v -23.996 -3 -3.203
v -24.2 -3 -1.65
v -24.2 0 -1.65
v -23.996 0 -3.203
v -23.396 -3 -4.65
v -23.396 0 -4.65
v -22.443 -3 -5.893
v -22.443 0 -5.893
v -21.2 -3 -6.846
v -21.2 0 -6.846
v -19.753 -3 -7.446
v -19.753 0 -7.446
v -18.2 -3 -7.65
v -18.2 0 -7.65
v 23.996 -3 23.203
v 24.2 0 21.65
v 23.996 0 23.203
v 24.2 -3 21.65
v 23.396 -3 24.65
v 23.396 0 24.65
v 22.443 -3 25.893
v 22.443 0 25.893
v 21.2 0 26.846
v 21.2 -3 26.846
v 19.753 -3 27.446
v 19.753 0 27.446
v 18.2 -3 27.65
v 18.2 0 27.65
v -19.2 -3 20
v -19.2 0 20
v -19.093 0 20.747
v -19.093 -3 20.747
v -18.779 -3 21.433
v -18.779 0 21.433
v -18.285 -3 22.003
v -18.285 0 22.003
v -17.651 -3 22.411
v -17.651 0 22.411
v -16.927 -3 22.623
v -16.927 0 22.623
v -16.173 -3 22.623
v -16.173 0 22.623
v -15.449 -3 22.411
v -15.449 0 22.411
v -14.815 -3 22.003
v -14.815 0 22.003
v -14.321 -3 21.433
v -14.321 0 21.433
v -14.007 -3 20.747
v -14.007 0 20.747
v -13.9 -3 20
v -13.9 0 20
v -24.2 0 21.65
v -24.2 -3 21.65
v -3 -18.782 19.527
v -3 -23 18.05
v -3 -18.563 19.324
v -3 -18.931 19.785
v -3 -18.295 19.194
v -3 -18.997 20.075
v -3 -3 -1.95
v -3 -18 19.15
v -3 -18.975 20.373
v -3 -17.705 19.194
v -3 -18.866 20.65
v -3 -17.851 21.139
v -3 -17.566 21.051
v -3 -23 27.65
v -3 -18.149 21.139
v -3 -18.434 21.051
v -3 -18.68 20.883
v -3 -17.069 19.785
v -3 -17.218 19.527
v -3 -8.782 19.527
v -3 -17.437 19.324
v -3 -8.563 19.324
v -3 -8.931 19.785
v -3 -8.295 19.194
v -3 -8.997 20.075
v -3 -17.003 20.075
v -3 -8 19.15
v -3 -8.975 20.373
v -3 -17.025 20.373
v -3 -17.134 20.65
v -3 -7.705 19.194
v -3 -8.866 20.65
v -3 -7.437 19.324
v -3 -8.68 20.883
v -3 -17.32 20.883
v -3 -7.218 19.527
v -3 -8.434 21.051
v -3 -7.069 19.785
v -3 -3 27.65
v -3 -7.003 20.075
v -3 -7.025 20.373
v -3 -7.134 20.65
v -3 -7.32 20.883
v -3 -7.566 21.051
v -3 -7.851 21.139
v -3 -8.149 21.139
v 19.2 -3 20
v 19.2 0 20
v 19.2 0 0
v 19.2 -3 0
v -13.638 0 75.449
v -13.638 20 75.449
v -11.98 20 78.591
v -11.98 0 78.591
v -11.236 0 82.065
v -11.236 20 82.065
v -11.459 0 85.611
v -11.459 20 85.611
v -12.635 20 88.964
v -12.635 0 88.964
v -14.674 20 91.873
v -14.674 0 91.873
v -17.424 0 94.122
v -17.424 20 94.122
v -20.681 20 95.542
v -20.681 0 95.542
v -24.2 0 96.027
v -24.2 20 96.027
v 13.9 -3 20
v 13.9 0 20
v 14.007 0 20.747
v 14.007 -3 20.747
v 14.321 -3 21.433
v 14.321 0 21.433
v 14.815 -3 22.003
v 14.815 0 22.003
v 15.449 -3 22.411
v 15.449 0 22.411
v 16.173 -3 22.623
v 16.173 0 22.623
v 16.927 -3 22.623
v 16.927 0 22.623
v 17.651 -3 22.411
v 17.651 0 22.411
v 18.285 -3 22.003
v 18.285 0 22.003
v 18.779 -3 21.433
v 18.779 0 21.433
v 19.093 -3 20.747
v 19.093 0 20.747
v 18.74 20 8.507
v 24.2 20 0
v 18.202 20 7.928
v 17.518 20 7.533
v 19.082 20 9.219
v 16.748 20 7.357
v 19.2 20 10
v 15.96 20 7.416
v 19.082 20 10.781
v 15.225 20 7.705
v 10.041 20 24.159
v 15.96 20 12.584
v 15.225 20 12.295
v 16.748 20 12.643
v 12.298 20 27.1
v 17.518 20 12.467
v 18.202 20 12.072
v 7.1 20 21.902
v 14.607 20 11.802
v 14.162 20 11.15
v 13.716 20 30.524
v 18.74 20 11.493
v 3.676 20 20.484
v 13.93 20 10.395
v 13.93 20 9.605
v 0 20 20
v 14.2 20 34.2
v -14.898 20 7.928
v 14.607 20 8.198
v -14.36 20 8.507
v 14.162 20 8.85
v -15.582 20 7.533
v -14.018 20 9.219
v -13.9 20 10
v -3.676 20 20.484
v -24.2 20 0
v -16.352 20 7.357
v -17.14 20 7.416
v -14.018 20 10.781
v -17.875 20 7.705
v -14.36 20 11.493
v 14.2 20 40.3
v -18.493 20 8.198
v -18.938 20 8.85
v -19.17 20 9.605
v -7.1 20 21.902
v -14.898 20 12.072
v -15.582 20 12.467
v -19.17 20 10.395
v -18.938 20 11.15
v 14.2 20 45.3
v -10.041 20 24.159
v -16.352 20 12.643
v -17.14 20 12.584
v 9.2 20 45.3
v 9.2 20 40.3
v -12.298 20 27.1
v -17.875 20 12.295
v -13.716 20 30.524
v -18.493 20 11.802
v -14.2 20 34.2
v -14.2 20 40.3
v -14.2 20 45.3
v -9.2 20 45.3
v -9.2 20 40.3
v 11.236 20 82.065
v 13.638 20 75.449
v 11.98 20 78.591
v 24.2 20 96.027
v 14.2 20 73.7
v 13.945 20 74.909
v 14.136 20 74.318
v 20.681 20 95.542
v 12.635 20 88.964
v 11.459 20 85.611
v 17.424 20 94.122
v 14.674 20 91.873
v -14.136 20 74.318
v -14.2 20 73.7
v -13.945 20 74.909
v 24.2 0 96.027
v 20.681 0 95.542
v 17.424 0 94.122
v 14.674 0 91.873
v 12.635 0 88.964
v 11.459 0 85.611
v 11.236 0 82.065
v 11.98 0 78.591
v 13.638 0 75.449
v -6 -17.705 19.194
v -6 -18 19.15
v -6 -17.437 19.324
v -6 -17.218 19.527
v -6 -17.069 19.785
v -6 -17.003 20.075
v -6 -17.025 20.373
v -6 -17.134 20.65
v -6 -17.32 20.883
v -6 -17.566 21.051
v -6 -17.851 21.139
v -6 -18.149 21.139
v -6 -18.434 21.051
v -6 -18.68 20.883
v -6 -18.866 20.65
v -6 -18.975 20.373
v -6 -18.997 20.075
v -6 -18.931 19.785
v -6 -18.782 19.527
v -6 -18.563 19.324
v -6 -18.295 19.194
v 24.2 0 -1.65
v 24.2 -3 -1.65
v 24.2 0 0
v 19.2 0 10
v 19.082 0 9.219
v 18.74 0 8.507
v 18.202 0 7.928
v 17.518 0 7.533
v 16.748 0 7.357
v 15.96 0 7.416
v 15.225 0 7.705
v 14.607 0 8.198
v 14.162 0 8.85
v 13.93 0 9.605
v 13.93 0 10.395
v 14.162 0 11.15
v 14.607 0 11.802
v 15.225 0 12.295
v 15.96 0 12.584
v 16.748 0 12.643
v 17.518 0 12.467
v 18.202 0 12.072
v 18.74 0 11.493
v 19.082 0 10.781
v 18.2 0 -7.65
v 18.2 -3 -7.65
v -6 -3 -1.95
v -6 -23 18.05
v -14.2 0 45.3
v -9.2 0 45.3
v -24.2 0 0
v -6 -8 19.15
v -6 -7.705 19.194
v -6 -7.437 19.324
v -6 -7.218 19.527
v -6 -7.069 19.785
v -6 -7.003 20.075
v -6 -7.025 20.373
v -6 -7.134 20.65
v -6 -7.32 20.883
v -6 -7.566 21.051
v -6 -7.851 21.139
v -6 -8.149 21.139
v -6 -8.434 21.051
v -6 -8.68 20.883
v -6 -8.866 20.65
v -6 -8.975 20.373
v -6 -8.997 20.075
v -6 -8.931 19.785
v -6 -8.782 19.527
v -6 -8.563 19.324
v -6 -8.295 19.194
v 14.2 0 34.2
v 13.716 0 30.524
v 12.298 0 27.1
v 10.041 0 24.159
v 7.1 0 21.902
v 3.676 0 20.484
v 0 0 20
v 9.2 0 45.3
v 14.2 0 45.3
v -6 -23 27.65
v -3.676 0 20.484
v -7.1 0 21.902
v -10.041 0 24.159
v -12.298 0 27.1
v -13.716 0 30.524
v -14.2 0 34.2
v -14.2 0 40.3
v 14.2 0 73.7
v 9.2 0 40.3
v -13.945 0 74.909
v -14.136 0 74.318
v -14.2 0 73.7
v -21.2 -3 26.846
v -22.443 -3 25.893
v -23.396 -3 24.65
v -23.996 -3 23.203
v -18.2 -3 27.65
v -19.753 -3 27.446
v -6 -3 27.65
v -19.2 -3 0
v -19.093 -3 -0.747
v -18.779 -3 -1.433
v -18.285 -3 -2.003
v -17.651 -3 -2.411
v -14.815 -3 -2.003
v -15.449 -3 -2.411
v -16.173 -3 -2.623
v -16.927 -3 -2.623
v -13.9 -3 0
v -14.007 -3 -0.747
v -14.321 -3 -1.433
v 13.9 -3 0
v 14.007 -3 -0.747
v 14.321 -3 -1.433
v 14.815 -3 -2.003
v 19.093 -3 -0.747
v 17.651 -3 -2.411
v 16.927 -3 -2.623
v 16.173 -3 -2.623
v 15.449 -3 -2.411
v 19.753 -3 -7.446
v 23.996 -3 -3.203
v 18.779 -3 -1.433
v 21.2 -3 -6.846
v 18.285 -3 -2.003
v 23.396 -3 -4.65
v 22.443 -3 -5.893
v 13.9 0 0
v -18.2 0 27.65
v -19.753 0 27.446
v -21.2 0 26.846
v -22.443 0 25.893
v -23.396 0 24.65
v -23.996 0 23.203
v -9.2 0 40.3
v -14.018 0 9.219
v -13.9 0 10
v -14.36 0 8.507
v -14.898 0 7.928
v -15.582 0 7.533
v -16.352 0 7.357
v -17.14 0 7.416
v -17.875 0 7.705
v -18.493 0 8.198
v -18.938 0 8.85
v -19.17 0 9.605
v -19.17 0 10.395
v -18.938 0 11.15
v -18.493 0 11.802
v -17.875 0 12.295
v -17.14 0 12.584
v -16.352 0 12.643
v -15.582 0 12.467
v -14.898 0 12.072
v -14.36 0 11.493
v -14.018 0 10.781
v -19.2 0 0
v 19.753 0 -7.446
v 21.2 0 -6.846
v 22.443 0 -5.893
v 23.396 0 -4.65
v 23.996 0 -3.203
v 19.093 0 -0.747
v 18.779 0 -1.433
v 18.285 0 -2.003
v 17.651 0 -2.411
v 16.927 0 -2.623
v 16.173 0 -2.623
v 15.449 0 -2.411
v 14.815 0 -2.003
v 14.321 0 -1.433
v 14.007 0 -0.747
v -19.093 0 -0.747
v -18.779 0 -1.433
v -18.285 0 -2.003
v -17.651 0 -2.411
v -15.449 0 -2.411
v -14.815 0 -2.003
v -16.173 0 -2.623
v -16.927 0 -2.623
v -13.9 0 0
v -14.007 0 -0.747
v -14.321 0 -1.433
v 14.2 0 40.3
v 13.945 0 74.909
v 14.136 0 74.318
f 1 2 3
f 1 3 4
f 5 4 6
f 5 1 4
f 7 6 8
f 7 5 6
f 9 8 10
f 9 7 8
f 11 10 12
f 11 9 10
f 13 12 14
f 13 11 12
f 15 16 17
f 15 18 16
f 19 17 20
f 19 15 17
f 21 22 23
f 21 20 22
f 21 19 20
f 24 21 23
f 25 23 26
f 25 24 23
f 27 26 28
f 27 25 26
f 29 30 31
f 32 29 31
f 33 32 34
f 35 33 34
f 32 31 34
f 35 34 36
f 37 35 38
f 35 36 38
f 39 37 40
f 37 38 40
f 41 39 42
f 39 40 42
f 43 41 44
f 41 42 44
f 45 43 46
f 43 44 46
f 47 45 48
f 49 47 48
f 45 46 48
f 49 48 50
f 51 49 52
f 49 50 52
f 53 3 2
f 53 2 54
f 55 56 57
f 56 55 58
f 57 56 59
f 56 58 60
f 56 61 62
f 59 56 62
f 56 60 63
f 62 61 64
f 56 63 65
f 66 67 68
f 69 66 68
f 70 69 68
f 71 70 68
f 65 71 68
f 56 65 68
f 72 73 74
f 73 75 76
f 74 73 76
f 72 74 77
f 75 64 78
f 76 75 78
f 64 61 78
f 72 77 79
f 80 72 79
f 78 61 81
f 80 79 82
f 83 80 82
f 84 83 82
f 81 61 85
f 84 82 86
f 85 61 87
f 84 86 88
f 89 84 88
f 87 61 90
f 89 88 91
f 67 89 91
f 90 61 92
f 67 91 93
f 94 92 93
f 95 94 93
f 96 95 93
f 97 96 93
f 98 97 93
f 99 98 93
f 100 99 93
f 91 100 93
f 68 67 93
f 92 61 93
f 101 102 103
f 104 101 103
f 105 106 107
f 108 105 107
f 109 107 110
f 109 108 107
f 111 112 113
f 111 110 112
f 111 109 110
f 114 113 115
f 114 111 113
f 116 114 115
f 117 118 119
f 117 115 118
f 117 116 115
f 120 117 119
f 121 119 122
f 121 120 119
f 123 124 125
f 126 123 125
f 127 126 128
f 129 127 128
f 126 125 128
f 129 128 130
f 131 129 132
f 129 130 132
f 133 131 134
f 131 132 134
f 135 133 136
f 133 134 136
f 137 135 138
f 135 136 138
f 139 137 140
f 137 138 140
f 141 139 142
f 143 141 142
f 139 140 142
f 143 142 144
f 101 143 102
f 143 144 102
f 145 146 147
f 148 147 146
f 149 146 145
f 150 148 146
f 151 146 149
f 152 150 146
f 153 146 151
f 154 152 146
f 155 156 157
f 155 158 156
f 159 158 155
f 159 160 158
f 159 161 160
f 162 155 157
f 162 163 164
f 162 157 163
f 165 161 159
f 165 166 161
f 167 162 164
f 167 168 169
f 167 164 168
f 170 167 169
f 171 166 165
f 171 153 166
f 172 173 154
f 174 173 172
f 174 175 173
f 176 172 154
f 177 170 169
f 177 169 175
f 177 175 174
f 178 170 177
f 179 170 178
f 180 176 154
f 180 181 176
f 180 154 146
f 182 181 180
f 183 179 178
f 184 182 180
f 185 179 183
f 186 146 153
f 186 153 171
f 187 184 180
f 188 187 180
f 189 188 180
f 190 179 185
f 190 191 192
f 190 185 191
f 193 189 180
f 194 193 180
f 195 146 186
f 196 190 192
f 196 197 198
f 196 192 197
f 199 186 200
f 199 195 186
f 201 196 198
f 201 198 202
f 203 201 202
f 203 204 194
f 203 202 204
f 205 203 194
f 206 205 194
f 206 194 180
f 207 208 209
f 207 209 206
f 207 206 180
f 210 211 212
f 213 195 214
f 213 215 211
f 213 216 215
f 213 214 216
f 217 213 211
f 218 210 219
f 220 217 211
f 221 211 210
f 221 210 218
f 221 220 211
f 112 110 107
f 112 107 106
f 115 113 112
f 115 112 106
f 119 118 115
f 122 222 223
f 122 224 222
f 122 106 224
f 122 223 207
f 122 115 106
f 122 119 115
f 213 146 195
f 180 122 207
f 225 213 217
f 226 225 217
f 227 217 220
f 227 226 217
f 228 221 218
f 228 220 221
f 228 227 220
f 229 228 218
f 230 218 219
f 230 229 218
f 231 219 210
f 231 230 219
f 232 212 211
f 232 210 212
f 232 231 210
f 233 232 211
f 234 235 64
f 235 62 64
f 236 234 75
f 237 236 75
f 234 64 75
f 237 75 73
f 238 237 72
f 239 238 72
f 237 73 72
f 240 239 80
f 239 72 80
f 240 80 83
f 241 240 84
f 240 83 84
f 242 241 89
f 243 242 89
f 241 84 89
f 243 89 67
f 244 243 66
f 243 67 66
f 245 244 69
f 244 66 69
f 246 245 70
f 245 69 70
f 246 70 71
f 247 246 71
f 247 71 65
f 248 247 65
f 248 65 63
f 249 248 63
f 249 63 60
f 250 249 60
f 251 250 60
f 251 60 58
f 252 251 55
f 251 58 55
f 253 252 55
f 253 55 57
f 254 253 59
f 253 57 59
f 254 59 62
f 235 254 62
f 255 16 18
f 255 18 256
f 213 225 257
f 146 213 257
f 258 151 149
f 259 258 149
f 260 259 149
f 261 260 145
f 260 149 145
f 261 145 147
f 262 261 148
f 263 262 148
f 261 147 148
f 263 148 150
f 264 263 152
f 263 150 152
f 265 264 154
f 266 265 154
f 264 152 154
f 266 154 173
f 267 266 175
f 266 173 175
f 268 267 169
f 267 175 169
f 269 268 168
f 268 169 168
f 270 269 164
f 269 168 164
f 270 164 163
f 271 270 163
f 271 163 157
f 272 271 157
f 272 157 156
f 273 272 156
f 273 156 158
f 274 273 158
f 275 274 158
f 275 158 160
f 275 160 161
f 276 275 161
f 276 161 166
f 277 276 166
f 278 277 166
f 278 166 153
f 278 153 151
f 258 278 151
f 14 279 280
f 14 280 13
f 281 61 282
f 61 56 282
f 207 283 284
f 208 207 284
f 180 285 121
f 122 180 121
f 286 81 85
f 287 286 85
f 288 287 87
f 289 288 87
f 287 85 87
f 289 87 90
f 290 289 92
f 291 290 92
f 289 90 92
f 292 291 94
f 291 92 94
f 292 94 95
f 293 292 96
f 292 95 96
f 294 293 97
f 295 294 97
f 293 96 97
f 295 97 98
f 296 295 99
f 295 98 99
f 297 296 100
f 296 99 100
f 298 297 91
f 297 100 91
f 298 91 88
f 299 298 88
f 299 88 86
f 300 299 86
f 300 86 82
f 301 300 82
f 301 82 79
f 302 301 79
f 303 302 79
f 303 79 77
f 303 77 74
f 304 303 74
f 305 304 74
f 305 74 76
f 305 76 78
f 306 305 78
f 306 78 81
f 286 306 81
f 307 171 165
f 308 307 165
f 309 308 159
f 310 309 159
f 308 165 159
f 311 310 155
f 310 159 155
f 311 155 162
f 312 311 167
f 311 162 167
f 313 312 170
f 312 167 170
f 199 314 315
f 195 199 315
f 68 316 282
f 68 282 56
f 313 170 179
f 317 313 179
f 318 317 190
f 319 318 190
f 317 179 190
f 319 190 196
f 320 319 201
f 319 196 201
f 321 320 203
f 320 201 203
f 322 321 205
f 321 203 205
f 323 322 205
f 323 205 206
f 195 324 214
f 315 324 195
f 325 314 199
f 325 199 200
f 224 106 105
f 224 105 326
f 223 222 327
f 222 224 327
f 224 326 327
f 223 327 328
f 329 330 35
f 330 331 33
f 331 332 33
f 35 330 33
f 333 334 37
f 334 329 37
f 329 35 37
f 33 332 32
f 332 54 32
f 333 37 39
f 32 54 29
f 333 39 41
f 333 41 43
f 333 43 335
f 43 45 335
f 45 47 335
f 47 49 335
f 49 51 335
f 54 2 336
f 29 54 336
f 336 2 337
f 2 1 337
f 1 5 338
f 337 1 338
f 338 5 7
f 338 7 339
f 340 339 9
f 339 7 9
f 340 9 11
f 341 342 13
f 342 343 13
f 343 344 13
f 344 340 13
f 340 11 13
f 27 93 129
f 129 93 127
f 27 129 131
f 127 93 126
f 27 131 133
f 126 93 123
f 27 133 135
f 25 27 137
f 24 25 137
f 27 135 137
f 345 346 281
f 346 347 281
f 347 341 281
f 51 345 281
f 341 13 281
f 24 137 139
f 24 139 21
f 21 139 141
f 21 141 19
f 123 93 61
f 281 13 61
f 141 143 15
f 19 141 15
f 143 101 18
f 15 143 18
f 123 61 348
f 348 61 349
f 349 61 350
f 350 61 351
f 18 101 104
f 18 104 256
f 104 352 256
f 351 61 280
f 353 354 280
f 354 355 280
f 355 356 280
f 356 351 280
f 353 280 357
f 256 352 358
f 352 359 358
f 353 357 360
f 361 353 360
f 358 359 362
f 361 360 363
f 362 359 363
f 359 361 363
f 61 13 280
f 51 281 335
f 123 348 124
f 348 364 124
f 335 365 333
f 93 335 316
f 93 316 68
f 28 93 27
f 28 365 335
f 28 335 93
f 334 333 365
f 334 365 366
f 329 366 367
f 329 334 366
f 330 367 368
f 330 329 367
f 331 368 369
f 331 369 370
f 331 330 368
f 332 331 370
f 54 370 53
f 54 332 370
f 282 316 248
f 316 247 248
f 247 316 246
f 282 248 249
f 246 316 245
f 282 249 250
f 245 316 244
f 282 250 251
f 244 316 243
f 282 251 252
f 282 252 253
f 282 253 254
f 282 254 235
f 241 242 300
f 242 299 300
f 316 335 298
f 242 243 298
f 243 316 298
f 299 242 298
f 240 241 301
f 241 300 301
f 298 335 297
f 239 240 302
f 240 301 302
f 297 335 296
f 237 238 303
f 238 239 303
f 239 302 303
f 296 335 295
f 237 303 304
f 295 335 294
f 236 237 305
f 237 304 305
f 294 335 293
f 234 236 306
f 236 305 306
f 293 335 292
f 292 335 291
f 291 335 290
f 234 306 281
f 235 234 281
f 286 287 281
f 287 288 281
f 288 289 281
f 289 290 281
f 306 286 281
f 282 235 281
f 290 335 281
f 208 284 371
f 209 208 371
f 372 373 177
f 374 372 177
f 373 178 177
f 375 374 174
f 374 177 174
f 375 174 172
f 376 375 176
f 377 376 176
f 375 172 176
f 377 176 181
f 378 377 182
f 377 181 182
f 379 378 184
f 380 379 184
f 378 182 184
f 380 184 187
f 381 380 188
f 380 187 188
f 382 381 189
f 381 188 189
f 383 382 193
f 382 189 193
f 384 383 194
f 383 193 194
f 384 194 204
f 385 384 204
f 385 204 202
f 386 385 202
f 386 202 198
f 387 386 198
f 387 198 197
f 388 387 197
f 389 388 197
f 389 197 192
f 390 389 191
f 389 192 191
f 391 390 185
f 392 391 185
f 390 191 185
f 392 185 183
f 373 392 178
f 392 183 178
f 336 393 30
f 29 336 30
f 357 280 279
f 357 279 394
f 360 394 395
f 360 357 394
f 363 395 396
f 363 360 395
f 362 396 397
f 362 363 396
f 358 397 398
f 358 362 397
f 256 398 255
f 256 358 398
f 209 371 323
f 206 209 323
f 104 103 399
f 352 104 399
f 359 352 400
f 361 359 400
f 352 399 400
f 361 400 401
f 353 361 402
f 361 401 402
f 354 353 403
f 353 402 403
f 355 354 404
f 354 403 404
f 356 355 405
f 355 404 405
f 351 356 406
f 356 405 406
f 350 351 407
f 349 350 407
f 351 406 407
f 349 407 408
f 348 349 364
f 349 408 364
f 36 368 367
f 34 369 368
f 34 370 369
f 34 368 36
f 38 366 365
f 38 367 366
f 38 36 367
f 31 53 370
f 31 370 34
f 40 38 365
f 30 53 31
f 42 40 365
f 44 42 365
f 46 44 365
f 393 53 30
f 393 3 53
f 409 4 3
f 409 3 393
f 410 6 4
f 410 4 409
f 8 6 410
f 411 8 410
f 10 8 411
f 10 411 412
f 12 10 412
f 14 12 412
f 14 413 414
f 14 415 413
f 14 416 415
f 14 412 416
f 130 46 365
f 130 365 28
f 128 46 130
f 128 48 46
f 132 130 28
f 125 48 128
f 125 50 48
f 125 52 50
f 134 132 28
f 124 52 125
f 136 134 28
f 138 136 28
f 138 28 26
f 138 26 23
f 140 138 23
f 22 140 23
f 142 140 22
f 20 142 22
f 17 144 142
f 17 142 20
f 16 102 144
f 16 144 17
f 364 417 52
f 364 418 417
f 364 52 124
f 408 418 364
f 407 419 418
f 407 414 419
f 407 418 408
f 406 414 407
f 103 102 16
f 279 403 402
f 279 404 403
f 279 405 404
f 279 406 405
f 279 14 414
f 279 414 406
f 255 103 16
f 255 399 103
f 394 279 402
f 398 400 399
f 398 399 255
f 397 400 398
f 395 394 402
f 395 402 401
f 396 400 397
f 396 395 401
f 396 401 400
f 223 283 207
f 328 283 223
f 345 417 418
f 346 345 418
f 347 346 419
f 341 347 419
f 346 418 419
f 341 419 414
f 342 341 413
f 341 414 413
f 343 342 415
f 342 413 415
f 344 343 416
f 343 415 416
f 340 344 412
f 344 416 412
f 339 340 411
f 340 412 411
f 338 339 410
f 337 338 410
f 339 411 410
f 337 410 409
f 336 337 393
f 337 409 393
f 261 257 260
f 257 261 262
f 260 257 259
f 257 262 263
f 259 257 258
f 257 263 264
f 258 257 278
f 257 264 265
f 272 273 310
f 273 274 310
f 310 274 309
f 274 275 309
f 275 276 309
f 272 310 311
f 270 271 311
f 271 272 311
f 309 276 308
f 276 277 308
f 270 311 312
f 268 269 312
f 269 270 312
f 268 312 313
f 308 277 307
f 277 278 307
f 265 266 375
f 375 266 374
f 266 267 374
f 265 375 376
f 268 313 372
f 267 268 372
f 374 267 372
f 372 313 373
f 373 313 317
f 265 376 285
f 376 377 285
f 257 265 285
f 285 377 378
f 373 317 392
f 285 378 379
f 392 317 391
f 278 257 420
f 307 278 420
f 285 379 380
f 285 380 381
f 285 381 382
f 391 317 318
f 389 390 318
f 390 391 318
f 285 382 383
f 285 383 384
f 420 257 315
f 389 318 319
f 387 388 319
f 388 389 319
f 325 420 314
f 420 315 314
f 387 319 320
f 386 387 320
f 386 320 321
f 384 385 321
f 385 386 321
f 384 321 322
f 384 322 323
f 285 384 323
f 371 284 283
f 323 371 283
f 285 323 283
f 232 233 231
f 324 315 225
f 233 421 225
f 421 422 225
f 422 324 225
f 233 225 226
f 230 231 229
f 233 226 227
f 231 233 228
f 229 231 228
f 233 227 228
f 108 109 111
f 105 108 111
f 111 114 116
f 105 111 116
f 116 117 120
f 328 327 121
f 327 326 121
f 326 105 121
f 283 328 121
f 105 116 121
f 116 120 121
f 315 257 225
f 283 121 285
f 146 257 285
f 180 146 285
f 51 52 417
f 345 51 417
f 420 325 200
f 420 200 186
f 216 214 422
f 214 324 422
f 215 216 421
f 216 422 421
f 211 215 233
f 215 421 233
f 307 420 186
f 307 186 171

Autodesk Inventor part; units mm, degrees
ref_plane "YZ Plane" through (0, 0, 0) normal (1, 0, 0) x (0, 1, 0)
ref_plane "XZ Plane" through (0, 0, 0) normal (0, 1, 0) x (-1, 0, 0)
ref_plane "XY Plane" through (0, 0, 0) normal (0, 0, 1) x (1, 0, 0)
sketch "Sketch1" plane through (0, 0, 0) normal (0, 1, 0) x (-1, 0, 0)
  line L0 (14.2, 73.7) -> (-14.2, 73.7) construction
  line L1 (-14.2, 73.7) -> (-14.2, 20)
  line L2 (-14.2, 20) -> (14.2, 20) construction
  line L3 (14.2, 20) -> (14.2, 73.7)
  line L4 (-24.2, 96.0274) -> (-24.2, 20)
  line L5 (24.2, 96.0274) -> (24.2, 20)
  line L6 (-24.2, 20) -> (-14.2, 20)
  line L7 (24.2, 20) -> (14.2, 20)
  line L8 (-24.2, 0) -> (24.2, 0)
  line L9 (24.2, 0) -> (24.2, 20)
  line L10 (24.2, 20) -> (-24.2, 20)
  line L11 (-24.2, 20) -> (-24.2, 0)
  arc A0 (-13.6375, 75.4489) -> (-14.2, 73.7) centre (-11.2, 73.7) ccw
  arc A1 (14.2, 73.7) -> (13.6375, 75.4489) centre (11.2, 73.7) ccw
  arc A2 (24.2, 96.0274) -> (13.6375, 75.4489) centre (24.2, 83.0274) ccw
  arc A3 (-13.6375, 75.4489) -> (-24.2, 96.0274) centre (-24.2, 83.0274) ccw
  line L12 (11.2, 89.334) -> (11.2, 76.7208) construction
  line L13 (-11.2, 89.334) -> (-11.2, 76.7208) construction
  line L14 (-14.2, 73.7) -> (14.2, 73.7)
  line L15 (14.2, 73.7) -> (14.2, 45.3)
  line L16 (14.2, 45.3) -> (-14.2, 45.3)
  line L17 (-14.2, 45.3) -> (-14.2, 73.7)
  line L18 (-14.2, 45.3) -> (-9.2, 45.3)
  line L19 (-9.2, 45.3) -> (-9.2, 40.3)
  line L20 (-9.2, 40.3) -> (-14.2, 40.3)
  line L21 (-14.2, 40.3) -> (-14.2, 45.3)
  line L22 (14.2, 45.3) -> (9.2, 45.3)
  line L23 (9.2, 45.3) -> (9.2, 40.3)
  line L24 (9.2, 40.3) -> (14.2, 40.3)
  line L25 (14.2, 40.3) -> (14.2, 45.3)
  point P0 (0, 0)
  point P1 (0, 0)
  point P2 (-11.2, 83.0274)
  point P3 (11.2, 83.0274)
  point P4 (-11.7, 45.3)
  point P5 (-11.7, 40.3)
  dimension "d0" = 28.4
  dimension "d2" = 3
  dimension "d4" = 3
  dimension "d5" = 3
  dimension "d6" = 20
  dimension "d7" = 10
  dimension "d13" = 53.7
  dimension "d40" = 5
  dimension "d41" = 5
extrude "Extrusion1" add sketch "Sketch1" along normal blind 20 contours L1 L6 L4 A3 A0 | L16 L19 L20 L1 | A1 A2 L5 L7 L3 | L3 L24 L23 L16 | L10 L7 L9 L8 L11 L6
sketch "Sketch2" plane through (0, 20, 0) normal (0, 1, 0) x (1, 0, 0)
  line L0 (-14.2, -20) -> (14.2, -20) projected
  line L1 (0, -20) -> (0, 0) construction
  line L2 (24.2, -96.0274) -> (24.2, 0) projected
  line L3 (-24.2, 0) -> (-24.2, -96.0274) projected
  circle A0 centre (-16.55, -10) radius 2.65
  circle A1 centre (16.55, -10) radius 2.65
  line L4 (0, -10) -> (-24.2, -10) construction
  line L5 (-24.2, 0) -> (-24.2, -96.0274) projected
  line L6 (0, -10) -> (24.2, -10) construction
  dimension "d10" = 5.3
  dimension "d28" = 5
  dimension "d29" = 5
extrude "Extrusion2" cut sketch "Sketch2" against normal through all
fillet "Fillet1" radius 14.2 2 edges at (-14.2, 10, 20) (14.2, 10, 20)
sketch "Sketch4" plane through (0, 0, 0) normal (0, 1, 0) x (1, 0, 0)
  line L0 (-16.55, 0) -> (-16.55, -20) construction
  line L1 (-19.2, 0) -> (-19.2, -20)
  line L2 (-13.9, -20) -> (-13.9, 0)
  arc A0 (-13.9, 0) -> (-19.2, 0) centre (-16.55, 0) ccw
  arc A1 (-19.2, -20) -> (-13.9, -20) centre (-16.55, -20) ccw
  line L3 (16.55, 0) -> (16.55, -20) construction
  line L4 (13.9, 0) -> (13.9, -20)
  line L5 (19.2, -20) -> (19.2, 0)
  arc A2 (19.2, 0) -> (13.9, 0) centre (16.55, 0) ccw
  arc A3 (13.9, -20) -> (19.2, -20) centre (16.55, -20) ccw
  circle A4 centre (-16.55, -10) radius 2.65 projected
  circle A5 centre (16.55, -10) radius 2.65 projected
  circle A6 centre (16.55, -10) radius 2.65 projected
  circle A7 centre (-16.55, -10) radius 2.65 projected
  line L6 (-14.2, -73.7) -> (-14.2, -45.3) projected
  arc A8 (14.2, -34.2) -> (-14.2, -34.2) centre (0, -34.2) ccw projected
  line L7 (14.2, -34.2) -> (14.2, -40.3) projected
  arc A9 (13.6375, -75.4489) -> (14.2, -73.7) centre (11.2, -73.7) ccw projected
  arc A10 (13.6375, -75.4489) -> (24.2, -96.0274) centre (24.2, -83.0274) ccw projected
  line L8 (24.2, -96.0274) -> (24.2, 0) projected
  line L9 (24.2, 0) -> (-24.2, 0) projected
  line L10 (-24.2, 0) -> (-24.2, -96.0274) projected
  arc A11 (-24.2, -96.0274) -> (-13.6375, -75.4489) centre (-24.2, -83.0274) ccw projected
  arc A12 (-14.2, -73.7) -> (-13.6375, -75.4489) centre (-11.2, -73.7) ccw projected
  line L11 (-24.2, -27.65) -> (24.2, -27.65)
  line L12 (24.2, -27.65) -> (24.2, 7.65)
  line L13 (24.2, 7.65) -> (-24.2, 7.65)
  line L14 (-24.2, 7.65) -> (-24.2, -27.65)
  line L15 (-14.2, -45.3) -> (-9.2, -45.3) projected
  line L16 (-9.2, -45.3) -> (-9.2, -40.3) projected
  line L17 (-9.2, -40.3) -> (-14.2, -40.3) projected
  line L18 (-14.2, -40.3) -> (-14.2, -34.2) projected
  line L19 (14.2, -40.3) -> (9.2, -40.3) projected
  line L20 (9.2, -40.3) -> (9.2, -45.3) projected
  line L21 (9.2, -45.3) -> (14.2, -45.3) projected
  line L22 (14.2, -45.3) -> (14.2, -73.7) projected
  point P0 (0, 0)
  point P1 (-16.55, 2.65)
  point P2 (-16.55, -22.65)
  point P3 (-24.2, 0)
  dimension "d15" = 20
  dimension "d16" = 5
  dimension "d17" = 5
extrude "Extrusion3" add sketch "Sketch4" against normal blind 3 separate body contours L9 L14 L13 L12 A2 A0 | L1 A1 L2 L9 L4 A3 L5 L8 L11 A8 L10 | A8 L11
sketch "Sketch5" plane through (0, -3, 0) normal (0, -1, 0) x (1, 0, 0)
  line L0 (24.2, 27.65) -> (-24.2, 27.65) projected
  line L1 (0, 27.65) -> (0, -7.65)
  line L2 (-24.2, -7.65) -> (24.2, -7.65) projected
  line L3 (-3, 27.65) -> (-6, 27.65)
  line L4 (-6, 27.65) -> (-6, 18.05)
  line L5 (-6, 18.05) -> (-3, 18.05)
  line L6 (-3, 18.05) -> (-3, 27.65)
  point P0 (0, 0)
  point P1 (-4.5, 27.65)
  point P2 (-4.5, 18.05)
  point P3 (-6, 27.65)
  dimension "d20" = 3
  dimension "d21" = 3
  dimension "d37" = 9.6
extrude "Extrusion4" add sketch "Sketch5" along normal blind 20 bodies 2
chamfer "Chamfer1" distance 20 angle 45 1 edges at (-4.5, -3, 18.05)
fillet "Fillet2" radius 6 4 edges at (24.2, -1.5, 27.65) (24.2, -1.5, -7.65) (-24.2, -1.5, 27.65) (-24.2, -1.5, -7.65)
sketch "Sketch6" plane through (-3, -3, 27.65) normal (1, 0, 0) x (0, 0, -1)
  circle A0 centre (7.5, -15) radius 1
  circle A1 centre (7.5, -5) radius 1
  line L0 (7.5, -15) -> (7.5, -5) construction
  line L1 (0, 0) -> (0, -20) projected
  line L2 (6, 0) -> (0, 0) projected
  point P0 (27.65, 3)
  point P1 (0, -10)
  dimension "d33" = 10
  dimension "d34" = 2
  dimension "d38" = 7.5
  dimension "d39" = 5
extrude "Extrusion5" cut sketch "Sketch6" against normal blind 20 bodies 2
properties part number "Clip brazo"
